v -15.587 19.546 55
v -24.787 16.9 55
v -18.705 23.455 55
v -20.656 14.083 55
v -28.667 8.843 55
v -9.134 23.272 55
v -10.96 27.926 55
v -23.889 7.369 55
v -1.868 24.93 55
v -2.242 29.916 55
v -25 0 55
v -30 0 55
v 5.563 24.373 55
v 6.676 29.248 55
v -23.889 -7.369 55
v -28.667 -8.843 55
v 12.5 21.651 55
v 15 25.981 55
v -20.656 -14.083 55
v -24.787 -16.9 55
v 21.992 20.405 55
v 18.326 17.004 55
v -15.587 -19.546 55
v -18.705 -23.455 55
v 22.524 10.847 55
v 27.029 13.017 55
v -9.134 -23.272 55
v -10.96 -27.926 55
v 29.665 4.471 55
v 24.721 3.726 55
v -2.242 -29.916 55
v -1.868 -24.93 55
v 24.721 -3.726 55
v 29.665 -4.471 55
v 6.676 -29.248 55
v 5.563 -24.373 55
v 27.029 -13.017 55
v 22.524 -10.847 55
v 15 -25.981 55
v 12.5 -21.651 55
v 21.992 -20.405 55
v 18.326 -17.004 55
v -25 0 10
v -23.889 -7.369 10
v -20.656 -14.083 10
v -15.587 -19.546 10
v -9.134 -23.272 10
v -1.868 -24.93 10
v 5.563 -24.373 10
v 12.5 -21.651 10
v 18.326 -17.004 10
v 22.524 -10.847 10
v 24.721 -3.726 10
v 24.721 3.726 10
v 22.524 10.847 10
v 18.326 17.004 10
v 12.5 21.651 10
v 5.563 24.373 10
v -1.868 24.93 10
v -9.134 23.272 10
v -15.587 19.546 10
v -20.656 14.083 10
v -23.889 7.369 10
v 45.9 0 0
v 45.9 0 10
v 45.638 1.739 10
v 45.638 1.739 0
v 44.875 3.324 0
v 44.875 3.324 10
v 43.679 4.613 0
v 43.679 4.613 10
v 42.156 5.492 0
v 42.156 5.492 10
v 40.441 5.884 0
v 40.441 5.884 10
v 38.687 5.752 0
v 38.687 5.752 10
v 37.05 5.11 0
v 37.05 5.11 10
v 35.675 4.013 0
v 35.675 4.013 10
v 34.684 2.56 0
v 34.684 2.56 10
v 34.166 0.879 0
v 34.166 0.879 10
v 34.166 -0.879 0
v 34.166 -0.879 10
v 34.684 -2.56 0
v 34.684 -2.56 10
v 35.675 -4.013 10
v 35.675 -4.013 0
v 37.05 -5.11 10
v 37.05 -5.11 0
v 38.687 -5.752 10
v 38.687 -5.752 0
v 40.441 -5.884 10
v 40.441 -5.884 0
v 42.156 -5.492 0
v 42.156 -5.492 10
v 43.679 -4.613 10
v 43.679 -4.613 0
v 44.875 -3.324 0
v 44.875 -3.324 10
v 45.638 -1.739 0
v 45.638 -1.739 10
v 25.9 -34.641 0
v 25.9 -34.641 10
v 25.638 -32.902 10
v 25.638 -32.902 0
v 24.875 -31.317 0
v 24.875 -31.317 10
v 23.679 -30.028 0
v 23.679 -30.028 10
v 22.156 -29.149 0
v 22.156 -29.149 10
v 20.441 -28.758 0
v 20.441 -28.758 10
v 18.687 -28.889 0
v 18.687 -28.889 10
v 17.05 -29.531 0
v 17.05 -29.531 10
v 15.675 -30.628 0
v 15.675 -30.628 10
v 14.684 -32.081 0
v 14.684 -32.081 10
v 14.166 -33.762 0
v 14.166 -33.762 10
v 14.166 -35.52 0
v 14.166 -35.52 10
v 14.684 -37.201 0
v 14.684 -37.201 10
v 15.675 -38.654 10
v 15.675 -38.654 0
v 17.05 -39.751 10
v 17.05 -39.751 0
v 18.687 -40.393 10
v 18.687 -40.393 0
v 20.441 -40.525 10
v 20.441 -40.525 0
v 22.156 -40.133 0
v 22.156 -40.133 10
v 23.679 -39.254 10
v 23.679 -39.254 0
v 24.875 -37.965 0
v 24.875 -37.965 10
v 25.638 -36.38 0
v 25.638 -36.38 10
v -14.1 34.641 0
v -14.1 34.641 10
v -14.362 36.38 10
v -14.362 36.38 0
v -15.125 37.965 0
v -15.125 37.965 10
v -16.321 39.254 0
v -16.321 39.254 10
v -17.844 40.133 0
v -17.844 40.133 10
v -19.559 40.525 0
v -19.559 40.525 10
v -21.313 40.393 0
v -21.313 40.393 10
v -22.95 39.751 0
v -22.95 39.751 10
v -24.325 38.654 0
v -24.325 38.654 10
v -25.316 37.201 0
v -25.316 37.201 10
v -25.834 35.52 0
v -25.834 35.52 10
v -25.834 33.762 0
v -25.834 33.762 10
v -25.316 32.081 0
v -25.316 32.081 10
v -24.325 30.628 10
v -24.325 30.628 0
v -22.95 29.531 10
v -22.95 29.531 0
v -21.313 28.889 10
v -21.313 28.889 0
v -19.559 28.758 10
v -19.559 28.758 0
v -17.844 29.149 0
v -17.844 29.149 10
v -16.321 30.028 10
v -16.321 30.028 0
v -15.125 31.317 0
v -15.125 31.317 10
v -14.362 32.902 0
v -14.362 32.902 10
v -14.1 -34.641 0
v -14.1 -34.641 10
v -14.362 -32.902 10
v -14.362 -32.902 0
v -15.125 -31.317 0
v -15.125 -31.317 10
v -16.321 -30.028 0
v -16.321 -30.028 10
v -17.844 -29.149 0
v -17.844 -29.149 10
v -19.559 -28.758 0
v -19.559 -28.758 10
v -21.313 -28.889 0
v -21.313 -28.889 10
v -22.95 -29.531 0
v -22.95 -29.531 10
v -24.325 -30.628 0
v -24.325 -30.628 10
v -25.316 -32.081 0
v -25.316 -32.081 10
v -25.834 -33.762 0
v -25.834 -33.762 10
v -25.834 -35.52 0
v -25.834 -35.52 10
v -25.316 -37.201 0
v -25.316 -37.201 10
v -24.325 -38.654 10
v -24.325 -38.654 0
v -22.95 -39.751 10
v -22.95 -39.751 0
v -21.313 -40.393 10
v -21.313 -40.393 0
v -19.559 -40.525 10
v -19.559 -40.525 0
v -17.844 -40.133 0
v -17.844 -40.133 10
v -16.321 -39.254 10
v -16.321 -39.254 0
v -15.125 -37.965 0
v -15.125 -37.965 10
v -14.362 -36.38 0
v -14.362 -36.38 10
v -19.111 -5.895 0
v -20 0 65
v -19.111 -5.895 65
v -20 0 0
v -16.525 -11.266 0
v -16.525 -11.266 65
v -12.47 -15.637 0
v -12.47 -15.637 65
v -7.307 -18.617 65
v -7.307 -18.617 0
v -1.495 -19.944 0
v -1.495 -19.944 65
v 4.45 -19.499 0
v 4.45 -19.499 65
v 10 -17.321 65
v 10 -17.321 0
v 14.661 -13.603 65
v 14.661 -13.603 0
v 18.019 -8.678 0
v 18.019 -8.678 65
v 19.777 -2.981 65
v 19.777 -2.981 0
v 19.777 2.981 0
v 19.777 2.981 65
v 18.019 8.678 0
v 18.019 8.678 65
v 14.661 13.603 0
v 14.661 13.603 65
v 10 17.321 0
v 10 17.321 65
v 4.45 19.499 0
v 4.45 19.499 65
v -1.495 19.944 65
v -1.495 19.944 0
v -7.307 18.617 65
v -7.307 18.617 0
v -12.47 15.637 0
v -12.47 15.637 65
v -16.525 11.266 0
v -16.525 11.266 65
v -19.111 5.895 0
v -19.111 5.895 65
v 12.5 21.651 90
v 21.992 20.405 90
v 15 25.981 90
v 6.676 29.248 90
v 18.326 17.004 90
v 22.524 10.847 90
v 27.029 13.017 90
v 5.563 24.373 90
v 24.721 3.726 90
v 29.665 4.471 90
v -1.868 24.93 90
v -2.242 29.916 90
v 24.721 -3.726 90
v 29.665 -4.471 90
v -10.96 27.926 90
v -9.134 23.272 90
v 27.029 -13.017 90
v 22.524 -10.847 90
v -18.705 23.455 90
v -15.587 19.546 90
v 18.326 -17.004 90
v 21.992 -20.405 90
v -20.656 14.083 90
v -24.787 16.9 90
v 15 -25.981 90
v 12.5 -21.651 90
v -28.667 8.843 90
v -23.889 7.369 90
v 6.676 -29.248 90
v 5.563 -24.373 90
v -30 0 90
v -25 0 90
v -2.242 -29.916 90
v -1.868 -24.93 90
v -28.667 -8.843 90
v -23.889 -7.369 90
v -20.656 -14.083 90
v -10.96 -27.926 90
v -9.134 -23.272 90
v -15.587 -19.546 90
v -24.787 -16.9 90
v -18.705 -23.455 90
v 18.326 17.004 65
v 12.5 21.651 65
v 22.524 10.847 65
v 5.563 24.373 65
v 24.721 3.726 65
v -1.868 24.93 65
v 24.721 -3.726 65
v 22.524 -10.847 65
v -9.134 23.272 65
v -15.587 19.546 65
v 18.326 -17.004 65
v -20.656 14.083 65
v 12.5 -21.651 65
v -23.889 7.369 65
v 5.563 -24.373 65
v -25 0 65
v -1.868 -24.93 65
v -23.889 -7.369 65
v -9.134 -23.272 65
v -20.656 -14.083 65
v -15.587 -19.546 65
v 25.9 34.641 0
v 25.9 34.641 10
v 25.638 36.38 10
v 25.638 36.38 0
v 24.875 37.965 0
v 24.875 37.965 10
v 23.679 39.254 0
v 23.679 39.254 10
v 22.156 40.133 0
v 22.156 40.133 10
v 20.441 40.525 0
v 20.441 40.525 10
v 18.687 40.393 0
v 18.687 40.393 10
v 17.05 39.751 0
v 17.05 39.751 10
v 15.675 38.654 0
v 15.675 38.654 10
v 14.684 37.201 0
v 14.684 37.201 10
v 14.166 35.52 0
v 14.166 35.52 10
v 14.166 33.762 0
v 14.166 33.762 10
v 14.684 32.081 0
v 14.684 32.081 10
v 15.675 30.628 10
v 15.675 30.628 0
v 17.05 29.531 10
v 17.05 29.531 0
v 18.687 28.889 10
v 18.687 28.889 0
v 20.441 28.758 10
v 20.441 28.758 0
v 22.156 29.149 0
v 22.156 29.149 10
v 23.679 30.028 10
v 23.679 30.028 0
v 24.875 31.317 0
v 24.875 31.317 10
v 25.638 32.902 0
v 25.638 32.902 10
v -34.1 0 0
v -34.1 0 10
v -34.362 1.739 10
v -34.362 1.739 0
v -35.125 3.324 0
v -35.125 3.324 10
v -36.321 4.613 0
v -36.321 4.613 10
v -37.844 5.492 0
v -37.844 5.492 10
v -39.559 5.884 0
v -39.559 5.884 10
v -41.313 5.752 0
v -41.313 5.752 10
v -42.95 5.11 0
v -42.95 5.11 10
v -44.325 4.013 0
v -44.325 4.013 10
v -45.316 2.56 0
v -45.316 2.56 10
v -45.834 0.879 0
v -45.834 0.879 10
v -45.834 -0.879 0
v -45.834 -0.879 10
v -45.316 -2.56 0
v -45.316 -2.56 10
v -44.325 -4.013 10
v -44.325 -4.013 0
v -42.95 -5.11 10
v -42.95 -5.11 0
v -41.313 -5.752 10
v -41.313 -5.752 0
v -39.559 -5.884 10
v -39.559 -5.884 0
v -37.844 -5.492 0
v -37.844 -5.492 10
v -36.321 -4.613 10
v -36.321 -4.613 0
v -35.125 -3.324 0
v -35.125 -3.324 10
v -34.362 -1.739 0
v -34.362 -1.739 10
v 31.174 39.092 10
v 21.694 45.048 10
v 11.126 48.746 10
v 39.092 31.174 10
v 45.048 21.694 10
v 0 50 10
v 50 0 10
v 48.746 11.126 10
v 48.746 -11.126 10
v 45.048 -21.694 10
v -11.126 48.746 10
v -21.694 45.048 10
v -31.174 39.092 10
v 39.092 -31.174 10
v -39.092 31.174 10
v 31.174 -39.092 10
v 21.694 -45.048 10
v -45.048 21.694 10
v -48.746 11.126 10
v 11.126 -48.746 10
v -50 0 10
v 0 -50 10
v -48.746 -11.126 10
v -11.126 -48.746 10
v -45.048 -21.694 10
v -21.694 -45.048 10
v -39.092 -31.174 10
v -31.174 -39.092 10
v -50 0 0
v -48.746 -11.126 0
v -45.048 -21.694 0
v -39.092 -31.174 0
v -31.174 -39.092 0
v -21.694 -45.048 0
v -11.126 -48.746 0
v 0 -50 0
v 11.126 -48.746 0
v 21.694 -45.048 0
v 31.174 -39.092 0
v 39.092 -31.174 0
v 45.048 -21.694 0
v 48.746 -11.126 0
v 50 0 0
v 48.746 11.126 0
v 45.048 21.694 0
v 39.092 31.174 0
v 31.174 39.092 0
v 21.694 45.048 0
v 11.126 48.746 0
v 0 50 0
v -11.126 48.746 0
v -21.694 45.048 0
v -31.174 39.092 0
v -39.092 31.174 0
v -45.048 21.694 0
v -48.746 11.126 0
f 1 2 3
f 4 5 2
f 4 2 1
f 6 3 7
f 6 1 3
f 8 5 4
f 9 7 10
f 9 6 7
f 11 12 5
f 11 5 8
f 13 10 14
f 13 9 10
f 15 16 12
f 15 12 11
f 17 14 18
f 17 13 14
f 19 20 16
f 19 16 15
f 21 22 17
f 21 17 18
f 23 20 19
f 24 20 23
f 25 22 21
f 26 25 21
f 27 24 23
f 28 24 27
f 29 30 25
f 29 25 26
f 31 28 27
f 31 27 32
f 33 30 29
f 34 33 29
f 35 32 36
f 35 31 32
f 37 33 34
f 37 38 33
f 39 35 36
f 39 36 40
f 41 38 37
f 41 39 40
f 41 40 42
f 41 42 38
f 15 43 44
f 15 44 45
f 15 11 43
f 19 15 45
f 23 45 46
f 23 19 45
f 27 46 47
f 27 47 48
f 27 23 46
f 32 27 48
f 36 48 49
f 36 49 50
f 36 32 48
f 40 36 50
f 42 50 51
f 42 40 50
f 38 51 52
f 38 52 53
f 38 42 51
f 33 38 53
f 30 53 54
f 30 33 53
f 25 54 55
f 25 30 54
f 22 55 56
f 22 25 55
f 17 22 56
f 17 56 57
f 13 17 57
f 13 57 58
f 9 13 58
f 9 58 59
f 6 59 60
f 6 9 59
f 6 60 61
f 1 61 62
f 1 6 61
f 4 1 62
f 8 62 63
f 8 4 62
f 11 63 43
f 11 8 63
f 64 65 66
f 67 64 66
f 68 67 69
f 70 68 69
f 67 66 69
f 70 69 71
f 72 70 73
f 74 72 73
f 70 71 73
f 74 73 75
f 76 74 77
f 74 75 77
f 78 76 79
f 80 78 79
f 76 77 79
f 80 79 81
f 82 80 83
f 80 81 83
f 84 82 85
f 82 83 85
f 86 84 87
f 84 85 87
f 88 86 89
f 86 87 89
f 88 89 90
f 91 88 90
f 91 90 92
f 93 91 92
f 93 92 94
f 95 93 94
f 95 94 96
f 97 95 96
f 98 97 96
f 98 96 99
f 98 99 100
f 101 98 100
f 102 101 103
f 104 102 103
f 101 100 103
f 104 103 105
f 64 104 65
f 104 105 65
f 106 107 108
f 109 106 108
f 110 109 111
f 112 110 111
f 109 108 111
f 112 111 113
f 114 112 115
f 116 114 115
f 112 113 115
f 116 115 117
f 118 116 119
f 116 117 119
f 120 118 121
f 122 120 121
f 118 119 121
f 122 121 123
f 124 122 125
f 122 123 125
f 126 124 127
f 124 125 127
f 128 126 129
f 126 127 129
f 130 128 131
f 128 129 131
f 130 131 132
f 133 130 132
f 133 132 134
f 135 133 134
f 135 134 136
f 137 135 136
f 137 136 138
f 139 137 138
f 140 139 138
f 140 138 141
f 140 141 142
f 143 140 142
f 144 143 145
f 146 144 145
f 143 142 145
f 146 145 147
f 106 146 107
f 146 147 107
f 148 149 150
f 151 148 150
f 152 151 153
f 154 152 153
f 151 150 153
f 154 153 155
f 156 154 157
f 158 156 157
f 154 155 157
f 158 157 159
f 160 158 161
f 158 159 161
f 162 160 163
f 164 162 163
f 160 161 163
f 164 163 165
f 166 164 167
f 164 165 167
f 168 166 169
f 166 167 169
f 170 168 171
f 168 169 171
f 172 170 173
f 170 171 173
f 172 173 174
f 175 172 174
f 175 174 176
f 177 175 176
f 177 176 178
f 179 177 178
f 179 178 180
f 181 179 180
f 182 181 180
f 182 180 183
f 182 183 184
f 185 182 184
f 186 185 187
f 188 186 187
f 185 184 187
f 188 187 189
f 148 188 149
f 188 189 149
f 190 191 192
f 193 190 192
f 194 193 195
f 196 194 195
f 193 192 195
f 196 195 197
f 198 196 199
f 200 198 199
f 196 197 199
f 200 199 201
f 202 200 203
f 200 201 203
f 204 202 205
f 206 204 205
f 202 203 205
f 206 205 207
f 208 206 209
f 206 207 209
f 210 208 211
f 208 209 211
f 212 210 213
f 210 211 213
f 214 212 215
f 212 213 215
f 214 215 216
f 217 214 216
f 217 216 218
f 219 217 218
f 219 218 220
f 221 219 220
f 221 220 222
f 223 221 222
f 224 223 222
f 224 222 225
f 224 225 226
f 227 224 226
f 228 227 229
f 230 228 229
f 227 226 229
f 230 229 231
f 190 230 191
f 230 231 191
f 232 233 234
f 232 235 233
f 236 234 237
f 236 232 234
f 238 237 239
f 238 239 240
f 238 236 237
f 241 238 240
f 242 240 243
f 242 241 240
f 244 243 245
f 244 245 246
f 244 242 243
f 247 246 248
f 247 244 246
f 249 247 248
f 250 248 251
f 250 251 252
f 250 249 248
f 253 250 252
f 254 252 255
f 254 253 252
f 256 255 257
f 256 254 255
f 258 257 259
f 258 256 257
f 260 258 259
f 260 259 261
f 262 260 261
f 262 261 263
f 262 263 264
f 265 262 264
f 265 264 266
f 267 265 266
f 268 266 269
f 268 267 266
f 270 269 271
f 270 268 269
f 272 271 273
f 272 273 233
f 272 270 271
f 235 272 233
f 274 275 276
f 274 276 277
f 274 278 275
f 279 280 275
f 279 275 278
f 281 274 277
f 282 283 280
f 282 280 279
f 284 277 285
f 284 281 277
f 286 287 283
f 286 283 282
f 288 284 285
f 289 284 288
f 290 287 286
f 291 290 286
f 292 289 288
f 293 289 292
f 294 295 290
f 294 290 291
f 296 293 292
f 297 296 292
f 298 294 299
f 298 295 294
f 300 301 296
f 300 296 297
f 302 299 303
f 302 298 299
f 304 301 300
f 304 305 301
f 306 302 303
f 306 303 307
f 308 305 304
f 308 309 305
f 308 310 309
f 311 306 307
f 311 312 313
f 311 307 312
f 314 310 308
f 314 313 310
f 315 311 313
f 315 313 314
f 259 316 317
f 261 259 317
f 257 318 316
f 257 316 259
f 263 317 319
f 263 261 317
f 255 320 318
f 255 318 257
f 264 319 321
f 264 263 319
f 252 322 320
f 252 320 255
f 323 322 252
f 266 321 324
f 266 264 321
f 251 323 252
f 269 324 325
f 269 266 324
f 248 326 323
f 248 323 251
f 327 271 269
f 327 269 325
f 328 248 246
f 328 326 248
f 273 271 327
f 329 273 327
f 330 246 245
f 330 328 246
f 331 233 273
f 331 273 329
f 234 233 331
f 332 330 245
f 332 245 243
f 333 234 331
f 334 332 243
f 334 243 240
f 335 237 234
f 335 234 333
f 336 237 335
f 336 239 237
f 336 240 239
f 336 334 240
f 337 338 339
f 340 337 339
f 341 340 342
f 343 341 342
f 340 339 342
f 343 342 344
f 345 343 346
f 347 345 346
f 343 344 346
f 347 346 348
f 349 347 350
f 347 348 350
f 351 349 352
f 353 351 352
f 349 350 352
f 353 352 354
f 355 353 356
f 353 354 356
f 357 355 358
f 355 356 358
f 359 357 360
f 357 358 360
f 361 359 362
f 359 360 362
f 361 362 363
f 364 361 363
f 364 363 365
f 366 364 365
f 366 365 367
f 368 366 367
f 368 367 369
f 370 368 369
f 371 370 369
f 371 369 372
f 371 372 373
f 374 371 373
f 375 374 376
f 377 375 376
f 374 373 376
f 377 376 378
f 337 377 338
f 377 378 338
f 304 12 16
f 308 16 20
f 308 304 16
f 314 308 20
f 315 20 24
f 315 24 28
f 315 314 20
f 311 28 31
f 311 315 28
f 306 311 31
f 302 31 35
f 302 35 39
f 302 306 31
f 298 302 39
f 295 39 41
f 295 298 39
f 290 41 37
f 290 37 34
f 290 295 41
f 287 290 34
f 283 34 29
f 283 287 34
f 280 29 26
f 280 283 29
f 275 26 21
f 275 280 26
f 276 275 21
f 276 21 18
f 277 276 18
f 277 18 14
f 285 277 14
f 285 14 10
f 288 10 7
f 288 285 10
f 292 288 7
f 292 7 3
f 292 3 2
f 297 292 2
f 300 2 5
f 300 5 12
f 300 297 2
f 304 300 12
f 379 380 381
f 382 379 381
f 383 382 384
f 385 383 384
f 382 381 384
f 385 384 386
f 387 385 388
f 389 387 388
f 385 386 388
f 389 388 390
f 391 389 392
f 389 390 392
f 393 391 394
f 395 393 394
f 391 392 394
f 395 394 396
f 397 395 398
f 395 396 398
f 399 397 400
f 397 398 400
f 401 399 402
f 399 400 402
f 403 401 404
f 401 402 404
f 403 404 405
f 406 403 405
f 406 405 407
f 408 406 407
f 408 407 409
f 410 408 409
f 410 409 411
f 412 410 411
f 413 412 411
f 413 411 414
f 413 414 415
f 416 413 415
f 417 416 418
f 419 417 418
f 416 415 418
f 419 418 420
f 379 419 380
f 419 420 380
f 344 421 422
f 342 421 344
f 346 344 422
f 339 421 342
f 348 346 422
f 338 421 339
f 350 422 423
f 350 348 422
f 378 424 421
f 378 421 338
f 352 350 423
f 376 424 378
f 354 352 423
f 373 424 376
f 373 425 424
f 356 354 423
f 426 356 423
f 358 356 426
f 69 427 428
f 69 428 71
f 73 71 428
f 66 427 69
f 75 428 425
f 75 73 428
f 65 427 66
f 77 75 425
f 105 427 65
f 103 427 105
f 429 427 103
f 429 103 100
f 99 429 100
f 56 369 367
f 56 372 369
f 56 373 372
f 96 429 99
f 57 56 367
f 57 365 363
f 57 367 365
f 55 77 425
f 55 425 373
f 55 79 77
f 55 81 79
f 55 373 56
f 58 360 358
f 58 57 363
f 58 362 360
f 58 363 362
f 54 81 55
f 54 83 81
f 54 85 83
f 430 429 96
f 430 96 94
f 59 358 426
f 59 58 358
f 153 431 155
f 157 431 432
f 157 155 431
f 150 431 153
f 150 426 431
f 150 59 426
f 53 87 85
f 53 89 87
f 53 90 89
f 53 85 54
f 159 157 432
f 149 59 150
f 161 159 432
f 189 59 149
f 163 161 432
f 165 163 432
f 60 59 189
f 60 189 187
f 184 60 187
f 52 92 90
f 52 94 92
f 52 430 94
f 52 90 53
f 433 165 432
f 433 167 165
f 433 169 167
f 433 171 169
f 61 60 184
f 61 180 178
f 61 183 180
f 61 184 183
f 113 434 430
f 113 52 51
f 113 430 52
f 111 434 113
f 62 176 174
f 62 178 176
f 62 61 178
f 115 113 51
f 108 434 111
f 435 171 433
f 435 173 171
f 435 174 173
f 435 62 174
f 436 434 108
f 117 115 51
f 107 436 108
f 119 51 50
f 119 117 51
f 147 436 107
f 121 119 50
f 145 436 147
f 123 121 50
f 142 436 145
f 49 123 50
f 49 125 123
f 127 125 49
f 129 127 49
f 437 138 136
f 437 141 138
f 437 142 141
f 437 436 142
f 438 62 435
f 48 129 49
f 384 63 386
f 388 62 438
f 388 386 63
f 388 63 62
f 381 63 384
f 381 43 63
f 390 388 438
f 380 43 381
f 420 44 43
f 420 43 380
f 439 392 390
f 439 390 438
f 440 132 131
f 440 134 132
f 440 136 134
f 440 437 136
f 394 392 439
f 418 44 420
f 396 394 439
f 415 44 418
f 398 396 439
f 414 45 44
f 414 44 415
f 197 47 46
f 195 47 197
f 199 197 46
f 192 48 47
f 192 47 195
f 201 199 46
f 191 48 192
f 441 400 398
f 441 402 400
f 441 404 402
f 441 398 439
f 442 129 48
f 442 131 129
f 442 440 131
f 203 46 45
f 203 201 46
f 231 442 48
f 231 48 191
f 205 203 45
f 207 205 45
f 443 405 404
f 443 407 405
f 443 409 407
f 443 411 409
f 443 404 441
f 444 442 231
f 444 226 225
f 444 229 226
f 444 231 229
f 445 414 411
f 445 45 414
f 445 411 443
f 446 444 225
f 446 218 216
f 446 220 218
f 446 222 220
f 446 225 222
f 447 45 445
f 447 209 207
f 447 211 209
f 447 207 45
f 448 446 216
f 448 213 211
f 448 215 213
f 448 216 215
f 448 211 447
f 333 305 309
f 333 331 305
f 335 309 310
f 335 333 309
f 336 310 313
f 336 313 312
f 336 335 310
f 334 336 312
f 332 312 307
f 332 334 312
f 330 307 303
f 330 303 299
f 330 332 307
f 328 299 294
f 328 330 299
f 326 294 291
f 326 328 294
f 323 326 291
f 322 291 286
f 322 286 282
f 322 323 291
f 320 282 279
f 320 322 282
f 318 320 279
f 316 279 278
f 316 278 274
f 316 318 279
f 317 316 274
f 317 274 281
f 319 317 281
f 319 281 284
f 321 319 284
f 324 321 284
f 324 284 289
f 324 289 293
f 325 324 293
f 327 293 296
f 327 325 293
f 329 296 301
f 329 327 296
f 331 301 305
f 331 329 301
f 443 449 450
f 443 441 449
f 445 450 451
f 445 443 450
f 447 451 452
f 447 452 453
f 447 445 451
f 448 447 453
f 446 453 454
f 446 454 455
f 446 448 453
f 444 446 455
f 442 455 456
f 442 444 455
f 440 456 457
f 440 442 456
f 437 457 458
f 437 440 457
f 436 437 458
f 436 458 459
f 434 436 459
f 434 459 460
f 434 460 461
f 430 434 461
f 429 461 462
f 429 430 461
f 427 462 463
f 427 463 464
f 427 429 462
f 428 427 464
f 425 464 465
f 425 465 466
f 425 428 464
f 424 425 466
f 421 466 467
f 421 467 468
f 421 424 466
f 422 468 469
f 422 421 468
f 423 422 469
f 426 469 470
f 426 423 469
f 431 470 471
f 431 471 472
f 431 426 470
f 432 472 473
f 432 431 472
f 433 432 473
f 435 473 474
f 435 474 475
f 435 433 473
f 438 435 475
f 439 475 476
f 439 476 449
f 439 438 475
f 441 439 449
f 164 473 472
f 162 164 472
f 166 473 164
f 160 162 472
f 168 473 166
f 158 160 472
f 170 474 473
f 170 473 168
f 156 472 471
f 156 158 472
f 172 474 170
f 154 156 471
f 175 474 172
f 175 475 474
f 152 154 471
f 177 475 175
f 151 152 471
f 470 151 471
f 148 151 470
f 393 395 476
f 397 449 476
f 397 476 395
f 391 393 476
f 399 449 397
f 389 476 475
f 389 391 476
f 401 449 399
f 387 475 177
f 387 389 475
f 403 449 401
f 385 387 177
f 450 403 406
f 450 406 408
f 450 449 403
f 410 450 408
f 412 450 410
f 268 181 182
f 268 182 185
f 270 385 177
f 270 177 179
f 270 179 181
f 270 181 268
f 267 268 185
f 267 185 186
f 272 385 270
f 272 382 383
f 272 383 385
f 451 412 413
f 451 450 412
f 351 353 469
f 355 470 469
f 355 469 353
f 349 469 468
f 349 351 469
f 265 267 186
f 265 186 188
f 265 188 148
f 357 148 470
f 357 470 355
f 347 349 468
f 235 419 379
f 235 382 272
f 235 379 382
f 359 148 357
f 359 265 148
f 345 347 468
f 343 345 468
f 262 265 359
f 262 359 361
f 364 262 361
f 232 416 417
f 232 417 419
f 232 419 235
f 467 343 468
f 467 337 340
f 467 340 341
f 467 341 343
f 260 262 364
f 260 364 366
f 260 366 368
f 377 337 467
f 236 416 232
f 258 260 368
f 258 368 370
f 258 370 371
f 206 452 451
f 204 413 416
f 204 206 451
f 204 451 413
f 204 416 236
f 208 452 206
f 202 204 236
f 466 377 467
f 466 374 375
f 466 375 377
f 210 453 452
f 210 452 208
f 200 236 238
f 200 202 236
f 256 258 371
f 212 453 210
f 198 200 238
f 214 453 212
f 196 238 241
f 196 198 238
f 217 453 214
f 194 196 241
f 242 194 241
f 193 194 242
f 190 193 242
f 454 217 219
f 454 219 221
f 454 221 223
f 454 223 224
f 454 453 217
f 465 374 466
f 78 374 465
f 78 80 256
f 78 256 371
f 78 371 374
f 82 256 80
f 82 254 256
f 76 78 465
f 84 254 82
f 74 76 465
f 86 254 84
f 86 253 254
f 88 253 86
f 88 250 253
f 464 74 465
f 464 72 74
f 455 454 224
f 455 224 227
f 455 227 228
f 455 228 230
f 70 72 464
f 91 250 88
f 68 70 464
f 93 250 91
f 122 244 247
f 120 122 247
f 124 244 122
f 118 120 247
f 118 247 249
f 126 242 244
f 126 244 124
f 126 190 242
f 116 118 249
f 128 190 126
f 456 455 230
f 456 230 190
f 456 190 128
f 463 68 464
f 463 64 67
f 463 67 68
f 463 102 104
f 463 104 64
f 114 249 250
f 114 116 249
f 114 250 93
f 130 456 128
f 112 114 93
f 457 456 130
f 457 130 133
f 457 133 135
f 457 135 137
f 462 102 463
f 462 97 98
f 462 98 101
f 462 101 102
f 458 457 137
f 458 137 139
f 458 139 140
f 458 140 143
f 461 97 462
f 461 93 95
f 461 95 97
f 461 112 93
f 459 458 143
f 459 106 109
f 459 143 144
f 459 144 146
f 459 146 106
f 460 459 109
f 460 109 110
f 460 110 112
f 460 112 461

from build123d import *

# Parameters (mm, degrees)
SKETCH2_R          = 5.9
CUT_EXTRUDE1_DEPTH = 10


with BuildPart() as part:
    # Sketch1 → Revolve1 (revolve)
    with BuildSketch(Plane(origin=(0, 0, 0), x_dir=(0, 0, -1), z_dir=(1, 0, 0)), mode=Mode.PRIVATE) as revolve1_sk:
        Polygon((0, 20), (0, 50), (-10, 50), (-10, 25), (-55, 25), (-55, 30), (-90, 30), (-90, 25), (-65, 25), (-65, 20), align=None)
    revolve(revolve1_sk.sketch.rotate(Axis((0, 0, 0), (0, 0, 1)), 90), axis=Axis((0, 0, 0), (0, 0, 1)))

    # Sketch2 → Cut-Extrude1 (cut)
    with BuildSketch(Plane.XY.offset(10)):
        with Locations((40, 0)):
            Circle(SKETCH2_R)
        with Locations((20, -34.641016151)):
            Circle(SKETCH2_R)
        with Locations((-20, -34.641016151)):
            Circle(SKETCH2_R)
        with Locations((-40, 0)):
            Circle(SKETCH2_R)
        with Locations((-20, 34.641016151)):
            Circle(SKETCH2_R)
        with Locations((20, 34.641016151)):
            Circle(SKETCH2_R)
    extrude(amount=-CUT_EXTRUDE1_DEPTH, mode=Mode.SUBTRACT)


solid = part.part
